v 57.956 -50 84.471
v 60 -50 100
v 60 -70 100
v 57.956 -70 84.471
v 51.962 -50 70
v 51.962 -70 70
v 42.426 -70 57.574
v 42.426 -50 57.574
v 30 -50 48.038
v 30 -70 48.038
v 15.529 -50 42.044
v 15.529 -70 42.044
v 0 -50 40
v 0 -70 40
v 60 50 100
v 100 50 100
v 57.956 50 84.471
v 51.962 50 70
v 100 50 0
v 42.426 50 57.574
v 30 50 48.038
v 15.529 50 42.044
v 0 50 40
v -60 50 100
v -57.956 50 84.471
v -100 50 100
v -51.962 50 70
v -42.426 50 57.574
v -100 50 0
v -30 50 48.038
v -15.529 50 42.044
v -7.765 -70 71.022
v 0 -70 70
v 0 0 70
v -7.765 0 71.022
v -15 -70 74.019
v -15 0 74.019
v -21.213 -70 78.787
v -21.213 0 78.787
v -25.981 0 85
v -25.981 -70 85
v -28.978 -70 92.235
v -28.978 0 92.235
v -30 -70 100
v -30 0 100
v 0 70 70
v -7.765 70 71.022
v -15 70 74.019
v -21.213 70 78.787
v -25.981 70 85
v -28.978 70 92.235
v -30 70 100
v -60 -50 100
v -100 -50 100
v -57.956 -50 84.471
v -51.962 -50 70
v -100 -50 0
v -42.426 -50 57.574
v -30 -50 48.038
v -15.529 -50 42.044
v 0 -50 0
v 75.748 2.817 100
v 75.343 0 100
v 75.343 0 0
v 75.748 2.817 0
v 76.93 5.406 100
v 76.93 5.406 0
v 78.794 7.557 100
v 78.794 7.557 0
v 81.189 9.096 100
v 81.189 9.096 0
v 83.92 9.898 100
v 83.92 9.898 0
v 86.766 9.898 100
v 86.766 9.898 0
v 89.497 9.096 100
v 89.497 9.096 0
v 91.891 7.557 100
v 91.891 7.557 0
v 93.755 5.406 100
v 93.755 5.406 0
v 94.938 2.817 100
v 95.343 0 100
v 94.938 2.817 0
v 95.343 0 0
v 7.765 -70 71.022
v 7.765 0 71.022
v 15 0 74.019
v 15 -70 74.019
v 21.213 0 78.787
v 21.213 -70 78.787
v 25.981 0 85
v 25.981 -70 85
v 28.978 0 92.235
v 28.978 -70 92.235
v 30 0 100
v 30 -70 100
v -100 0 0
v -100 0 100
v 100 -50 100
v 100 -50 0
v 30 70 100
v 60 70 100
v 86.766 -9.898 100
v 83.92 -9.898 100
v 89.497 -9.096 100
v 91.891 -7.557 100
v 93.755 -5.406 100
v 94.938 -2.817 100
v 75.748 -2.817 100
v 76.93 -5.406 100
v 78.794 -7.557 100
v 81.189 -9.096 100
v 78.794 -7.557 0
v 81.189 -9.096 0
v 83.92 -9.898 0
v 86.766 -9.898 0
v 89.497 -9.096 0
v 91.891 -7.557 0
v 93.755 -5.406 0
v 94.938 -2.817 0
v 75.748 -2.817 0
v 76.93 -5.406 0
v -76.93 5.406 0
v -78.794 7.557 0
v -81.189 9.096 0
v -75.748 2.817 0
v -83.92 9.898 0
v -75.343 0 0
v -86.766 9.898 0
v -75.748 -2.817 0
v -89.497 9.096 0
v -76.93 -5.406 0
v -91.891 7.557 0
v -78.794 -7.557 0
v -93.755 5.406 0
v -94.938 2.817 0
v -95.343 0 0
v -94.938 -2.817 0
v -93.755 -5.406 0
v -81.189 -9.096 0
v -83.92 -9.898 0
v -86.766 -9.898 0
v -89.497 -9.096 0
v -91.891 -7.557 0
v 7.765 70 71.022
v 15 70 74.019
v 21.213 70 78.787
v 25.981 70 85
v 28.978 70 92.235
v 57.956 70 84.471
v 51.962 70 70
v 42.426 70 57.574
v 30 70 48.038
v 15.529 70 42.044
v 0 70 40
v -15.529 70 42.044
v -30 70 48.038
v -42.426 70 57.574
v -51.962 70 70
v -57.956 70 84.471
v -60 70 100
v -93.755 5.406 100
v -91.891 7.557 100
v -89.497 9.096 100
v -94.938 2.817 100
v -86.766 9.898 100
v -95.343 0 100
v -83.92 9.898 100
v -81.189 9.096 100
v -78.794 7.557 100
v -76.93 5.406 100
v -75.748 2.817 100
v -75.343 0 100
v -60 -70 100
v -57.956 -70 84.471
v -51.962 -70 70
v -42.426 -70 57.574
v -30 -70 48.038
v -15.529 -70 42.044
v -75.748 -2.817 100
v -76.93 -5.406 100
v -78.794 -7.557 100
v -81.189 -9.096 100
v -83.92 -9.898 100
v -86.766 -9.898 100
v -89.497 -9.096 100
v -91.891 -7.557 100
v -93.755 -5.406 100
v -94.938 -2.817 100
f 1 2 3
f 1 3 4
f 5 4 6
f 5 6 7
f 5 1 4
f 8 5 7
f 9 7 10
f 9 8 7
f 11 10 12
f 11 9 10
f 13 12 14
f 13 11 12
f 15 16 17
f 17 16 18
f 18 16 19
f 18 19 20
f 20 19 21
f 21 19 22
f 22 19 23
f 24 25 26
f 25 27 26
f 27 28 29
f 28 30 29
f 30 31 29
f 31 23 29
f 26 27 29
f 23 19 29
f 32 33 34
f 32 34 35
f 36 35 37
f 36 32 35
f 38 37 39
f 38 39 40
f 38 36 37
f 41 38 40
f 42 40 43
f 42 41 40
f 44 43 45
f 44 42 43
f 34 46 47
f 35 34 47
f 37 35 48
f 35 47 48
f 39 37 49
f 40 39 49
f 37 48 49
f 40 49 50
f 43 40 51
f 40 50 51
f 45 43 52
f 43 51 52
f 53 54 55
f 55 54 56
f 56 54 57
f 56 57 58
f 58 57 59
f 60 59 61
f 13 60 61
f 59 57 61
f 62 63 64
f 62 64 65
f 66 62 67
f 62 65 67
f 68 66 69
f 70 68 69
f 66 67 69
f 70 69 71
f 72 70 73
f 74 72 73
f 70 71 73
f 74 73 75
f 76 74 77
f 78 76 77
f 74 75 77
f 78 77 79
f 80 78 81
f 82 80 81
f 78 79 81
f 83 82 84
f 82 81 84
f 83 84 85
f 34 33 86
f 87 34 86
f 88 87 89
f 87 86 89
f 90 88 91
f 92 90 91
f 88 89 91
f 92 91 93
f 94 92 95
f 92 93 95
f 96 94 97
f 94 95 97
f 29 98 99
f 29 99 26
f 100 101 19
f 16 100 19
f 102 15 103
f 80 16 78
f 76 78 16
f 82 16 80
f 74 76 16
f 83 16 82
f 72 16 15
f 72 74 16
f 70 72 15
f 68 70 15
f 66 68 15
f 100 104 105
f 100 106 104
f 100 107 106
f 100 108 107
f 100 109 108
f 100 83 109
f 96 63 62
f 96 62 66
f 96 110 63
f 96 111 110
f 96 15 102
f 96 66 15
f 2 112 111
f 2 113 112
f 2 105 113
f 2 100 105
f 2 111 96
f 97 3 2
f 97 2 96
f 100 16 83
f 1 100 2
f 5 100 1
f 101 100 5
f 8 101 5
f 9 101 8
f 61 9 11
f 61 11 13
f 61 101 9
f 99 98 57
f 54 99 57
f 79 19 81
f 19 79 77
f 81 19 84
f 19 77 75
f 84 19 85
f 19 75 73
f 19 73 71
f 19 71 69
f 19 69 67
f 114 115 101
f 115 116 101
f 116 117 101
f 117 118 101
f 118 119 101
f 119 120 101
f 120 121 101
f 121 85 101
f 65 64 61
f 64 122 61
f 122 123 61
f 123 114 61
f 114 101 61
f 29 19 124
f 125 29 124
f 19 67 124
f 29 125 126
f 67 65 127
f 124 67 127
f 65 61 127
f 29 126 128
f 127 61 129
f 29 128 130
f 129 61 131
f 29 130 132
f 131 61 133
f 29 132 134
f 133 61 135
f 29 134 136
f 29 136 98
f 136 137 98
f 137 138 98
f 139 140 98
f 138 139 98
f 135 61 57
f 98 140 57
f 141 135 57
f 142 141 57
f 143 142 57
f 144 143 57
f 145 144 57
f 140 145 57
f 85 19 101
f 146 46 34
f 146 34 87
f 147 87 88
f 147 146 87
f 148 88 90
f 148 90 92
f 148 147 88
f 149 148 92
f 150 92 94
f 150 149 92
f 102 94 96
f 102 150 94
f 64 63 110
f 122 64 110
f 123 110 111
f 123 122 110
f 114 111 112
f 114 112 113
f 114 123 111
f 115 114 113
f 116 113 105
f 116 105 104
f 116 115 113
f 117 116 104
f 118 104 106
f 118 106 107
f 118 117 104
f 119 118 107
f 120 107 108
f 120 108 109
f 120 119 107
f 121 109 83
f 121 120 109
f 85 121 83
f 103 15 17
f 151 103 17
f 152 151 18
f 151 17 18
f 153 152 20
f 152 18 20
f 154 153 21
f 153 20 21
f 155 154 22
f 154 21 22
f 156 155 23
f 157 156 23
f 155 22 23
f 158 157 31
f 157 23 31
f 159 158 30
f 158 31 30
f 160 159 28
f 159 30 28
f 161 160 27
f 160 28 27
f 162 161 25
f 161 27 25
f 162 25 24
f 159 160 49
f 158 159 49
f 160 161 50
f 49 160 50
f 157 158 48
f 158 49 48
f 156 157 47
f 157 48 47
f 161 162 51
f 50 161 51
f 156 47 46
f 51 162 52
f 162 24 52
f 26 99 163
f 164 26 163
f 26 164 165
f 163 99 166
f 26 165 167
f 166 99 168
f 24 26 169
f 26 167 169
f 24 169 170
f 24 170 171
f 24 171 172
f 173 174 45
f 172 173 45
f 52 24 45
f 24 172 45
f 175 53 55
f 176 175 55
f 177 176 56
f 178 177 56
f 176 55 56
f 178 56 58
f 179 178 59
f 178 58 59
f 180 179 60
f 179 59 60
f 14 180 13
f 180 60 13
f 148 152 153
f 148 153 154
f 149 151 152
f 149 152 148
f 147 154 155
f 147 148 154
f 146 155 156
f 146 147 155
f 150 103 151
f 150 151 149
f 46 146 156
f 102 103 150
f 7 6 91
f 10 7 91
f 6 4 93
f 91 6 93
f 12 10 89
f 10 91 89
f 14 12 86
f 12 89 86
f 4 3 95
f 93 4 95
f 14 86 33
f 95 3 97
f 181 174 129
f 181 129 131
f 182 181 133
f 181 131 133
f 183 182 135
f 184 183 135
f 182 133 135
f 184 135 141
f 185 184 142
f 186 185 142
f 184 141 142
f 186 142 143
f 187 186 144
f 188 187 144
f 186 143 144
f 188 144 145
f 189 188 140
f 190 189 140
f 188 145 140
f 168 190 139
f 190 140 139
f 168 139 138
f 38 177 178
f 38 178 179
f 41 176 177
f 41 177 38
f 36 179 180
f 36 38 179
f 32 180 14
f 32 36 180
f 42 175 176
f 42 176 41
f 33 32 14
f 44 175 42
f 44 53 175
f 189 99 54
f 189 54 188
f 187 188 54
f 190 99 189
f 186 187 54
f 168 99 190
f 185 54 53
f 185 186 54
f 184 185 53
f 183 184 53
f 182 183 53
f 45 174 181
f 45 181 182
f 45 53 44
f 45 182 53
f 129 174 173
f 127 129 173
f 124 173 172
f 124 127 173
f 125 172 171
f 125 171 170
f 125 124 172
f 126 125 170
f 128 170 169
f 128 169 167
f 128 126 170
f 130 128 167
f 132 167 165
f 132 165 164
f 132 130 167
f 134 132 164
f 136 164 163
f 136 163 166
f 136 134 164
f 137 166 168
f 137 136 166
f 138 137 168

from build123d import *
from build123d import SkipClean  # not in build123d's __all__

# Parameters (mm, degrees)
F1_DEPTH = 100
F3_DEPTH = 20
F4_DEPTH = 50


with BuildPart() as f1:
    # F0 (on Top) → F1 (new body)
    with BuildSketch(Plane.XY):
        with BuildLine():
            Line((-100, -50), (0, -50))
            Line((0, -50), (0, 0))
            Line((0, 0), (-75.3427499533, 0))
            ThreePointArc((-75.3427499533, 0), (-85.3427499533, -10), (-95.3427499533, 0))
            Line((-95.3427499533, 0), (-100, 0))
            Line((-100, 0), (-100, -50))
        make_face()
    extrude(amount=F1_DEPTH)

    # F2 (on face) → F3 (join)
    with BuildSketch(Plane.XZ.offset(50)):
        with BuildLine():
            ThreePointArc((0, 70), (-21.2132034356, 78.7867965644), (-30, 100))
            Line((-30, 100), (-60, 100))
            ThreePointArc((-60, 100), (-42.4264068712, 57.5735931288), (0, 40))
            Line((0, 40), (0, 70))
        make_face()
    extrude(amount=F3_DEPTH)

    # F4 (cut, through all): a face of the model
    f4_faces = [f1.faces().sort_by_distance(p)[0] for p in [
        (-12.7323954474, -50, 87.2676045526),
    ]]
    extrude(f4_faces, amount=-F4_DEPTH, mode=Mode.SUBTRACT)

    # F5: F1 across plane


with BuildPart() as f1_1:
    add(f1.part, clean=False)
    with SkipClean():  # cleaning this boolean's faces spoils the solid; the shape is the same uncleaned
        add(f1.part.mirror(Plane.XZ), clean=False)

    # F6: F1 across face


with BuildPart() as f1_2:
    add(f1_1.part, clean=False)
    add(f1_1.part.mirror(Plane(origin=(0, -30.1219512195, 37.9268292683), x_dir=(0, 1, 0), z_dir=(1, 0, 0))), clean=False)


solid = f1_2.part
